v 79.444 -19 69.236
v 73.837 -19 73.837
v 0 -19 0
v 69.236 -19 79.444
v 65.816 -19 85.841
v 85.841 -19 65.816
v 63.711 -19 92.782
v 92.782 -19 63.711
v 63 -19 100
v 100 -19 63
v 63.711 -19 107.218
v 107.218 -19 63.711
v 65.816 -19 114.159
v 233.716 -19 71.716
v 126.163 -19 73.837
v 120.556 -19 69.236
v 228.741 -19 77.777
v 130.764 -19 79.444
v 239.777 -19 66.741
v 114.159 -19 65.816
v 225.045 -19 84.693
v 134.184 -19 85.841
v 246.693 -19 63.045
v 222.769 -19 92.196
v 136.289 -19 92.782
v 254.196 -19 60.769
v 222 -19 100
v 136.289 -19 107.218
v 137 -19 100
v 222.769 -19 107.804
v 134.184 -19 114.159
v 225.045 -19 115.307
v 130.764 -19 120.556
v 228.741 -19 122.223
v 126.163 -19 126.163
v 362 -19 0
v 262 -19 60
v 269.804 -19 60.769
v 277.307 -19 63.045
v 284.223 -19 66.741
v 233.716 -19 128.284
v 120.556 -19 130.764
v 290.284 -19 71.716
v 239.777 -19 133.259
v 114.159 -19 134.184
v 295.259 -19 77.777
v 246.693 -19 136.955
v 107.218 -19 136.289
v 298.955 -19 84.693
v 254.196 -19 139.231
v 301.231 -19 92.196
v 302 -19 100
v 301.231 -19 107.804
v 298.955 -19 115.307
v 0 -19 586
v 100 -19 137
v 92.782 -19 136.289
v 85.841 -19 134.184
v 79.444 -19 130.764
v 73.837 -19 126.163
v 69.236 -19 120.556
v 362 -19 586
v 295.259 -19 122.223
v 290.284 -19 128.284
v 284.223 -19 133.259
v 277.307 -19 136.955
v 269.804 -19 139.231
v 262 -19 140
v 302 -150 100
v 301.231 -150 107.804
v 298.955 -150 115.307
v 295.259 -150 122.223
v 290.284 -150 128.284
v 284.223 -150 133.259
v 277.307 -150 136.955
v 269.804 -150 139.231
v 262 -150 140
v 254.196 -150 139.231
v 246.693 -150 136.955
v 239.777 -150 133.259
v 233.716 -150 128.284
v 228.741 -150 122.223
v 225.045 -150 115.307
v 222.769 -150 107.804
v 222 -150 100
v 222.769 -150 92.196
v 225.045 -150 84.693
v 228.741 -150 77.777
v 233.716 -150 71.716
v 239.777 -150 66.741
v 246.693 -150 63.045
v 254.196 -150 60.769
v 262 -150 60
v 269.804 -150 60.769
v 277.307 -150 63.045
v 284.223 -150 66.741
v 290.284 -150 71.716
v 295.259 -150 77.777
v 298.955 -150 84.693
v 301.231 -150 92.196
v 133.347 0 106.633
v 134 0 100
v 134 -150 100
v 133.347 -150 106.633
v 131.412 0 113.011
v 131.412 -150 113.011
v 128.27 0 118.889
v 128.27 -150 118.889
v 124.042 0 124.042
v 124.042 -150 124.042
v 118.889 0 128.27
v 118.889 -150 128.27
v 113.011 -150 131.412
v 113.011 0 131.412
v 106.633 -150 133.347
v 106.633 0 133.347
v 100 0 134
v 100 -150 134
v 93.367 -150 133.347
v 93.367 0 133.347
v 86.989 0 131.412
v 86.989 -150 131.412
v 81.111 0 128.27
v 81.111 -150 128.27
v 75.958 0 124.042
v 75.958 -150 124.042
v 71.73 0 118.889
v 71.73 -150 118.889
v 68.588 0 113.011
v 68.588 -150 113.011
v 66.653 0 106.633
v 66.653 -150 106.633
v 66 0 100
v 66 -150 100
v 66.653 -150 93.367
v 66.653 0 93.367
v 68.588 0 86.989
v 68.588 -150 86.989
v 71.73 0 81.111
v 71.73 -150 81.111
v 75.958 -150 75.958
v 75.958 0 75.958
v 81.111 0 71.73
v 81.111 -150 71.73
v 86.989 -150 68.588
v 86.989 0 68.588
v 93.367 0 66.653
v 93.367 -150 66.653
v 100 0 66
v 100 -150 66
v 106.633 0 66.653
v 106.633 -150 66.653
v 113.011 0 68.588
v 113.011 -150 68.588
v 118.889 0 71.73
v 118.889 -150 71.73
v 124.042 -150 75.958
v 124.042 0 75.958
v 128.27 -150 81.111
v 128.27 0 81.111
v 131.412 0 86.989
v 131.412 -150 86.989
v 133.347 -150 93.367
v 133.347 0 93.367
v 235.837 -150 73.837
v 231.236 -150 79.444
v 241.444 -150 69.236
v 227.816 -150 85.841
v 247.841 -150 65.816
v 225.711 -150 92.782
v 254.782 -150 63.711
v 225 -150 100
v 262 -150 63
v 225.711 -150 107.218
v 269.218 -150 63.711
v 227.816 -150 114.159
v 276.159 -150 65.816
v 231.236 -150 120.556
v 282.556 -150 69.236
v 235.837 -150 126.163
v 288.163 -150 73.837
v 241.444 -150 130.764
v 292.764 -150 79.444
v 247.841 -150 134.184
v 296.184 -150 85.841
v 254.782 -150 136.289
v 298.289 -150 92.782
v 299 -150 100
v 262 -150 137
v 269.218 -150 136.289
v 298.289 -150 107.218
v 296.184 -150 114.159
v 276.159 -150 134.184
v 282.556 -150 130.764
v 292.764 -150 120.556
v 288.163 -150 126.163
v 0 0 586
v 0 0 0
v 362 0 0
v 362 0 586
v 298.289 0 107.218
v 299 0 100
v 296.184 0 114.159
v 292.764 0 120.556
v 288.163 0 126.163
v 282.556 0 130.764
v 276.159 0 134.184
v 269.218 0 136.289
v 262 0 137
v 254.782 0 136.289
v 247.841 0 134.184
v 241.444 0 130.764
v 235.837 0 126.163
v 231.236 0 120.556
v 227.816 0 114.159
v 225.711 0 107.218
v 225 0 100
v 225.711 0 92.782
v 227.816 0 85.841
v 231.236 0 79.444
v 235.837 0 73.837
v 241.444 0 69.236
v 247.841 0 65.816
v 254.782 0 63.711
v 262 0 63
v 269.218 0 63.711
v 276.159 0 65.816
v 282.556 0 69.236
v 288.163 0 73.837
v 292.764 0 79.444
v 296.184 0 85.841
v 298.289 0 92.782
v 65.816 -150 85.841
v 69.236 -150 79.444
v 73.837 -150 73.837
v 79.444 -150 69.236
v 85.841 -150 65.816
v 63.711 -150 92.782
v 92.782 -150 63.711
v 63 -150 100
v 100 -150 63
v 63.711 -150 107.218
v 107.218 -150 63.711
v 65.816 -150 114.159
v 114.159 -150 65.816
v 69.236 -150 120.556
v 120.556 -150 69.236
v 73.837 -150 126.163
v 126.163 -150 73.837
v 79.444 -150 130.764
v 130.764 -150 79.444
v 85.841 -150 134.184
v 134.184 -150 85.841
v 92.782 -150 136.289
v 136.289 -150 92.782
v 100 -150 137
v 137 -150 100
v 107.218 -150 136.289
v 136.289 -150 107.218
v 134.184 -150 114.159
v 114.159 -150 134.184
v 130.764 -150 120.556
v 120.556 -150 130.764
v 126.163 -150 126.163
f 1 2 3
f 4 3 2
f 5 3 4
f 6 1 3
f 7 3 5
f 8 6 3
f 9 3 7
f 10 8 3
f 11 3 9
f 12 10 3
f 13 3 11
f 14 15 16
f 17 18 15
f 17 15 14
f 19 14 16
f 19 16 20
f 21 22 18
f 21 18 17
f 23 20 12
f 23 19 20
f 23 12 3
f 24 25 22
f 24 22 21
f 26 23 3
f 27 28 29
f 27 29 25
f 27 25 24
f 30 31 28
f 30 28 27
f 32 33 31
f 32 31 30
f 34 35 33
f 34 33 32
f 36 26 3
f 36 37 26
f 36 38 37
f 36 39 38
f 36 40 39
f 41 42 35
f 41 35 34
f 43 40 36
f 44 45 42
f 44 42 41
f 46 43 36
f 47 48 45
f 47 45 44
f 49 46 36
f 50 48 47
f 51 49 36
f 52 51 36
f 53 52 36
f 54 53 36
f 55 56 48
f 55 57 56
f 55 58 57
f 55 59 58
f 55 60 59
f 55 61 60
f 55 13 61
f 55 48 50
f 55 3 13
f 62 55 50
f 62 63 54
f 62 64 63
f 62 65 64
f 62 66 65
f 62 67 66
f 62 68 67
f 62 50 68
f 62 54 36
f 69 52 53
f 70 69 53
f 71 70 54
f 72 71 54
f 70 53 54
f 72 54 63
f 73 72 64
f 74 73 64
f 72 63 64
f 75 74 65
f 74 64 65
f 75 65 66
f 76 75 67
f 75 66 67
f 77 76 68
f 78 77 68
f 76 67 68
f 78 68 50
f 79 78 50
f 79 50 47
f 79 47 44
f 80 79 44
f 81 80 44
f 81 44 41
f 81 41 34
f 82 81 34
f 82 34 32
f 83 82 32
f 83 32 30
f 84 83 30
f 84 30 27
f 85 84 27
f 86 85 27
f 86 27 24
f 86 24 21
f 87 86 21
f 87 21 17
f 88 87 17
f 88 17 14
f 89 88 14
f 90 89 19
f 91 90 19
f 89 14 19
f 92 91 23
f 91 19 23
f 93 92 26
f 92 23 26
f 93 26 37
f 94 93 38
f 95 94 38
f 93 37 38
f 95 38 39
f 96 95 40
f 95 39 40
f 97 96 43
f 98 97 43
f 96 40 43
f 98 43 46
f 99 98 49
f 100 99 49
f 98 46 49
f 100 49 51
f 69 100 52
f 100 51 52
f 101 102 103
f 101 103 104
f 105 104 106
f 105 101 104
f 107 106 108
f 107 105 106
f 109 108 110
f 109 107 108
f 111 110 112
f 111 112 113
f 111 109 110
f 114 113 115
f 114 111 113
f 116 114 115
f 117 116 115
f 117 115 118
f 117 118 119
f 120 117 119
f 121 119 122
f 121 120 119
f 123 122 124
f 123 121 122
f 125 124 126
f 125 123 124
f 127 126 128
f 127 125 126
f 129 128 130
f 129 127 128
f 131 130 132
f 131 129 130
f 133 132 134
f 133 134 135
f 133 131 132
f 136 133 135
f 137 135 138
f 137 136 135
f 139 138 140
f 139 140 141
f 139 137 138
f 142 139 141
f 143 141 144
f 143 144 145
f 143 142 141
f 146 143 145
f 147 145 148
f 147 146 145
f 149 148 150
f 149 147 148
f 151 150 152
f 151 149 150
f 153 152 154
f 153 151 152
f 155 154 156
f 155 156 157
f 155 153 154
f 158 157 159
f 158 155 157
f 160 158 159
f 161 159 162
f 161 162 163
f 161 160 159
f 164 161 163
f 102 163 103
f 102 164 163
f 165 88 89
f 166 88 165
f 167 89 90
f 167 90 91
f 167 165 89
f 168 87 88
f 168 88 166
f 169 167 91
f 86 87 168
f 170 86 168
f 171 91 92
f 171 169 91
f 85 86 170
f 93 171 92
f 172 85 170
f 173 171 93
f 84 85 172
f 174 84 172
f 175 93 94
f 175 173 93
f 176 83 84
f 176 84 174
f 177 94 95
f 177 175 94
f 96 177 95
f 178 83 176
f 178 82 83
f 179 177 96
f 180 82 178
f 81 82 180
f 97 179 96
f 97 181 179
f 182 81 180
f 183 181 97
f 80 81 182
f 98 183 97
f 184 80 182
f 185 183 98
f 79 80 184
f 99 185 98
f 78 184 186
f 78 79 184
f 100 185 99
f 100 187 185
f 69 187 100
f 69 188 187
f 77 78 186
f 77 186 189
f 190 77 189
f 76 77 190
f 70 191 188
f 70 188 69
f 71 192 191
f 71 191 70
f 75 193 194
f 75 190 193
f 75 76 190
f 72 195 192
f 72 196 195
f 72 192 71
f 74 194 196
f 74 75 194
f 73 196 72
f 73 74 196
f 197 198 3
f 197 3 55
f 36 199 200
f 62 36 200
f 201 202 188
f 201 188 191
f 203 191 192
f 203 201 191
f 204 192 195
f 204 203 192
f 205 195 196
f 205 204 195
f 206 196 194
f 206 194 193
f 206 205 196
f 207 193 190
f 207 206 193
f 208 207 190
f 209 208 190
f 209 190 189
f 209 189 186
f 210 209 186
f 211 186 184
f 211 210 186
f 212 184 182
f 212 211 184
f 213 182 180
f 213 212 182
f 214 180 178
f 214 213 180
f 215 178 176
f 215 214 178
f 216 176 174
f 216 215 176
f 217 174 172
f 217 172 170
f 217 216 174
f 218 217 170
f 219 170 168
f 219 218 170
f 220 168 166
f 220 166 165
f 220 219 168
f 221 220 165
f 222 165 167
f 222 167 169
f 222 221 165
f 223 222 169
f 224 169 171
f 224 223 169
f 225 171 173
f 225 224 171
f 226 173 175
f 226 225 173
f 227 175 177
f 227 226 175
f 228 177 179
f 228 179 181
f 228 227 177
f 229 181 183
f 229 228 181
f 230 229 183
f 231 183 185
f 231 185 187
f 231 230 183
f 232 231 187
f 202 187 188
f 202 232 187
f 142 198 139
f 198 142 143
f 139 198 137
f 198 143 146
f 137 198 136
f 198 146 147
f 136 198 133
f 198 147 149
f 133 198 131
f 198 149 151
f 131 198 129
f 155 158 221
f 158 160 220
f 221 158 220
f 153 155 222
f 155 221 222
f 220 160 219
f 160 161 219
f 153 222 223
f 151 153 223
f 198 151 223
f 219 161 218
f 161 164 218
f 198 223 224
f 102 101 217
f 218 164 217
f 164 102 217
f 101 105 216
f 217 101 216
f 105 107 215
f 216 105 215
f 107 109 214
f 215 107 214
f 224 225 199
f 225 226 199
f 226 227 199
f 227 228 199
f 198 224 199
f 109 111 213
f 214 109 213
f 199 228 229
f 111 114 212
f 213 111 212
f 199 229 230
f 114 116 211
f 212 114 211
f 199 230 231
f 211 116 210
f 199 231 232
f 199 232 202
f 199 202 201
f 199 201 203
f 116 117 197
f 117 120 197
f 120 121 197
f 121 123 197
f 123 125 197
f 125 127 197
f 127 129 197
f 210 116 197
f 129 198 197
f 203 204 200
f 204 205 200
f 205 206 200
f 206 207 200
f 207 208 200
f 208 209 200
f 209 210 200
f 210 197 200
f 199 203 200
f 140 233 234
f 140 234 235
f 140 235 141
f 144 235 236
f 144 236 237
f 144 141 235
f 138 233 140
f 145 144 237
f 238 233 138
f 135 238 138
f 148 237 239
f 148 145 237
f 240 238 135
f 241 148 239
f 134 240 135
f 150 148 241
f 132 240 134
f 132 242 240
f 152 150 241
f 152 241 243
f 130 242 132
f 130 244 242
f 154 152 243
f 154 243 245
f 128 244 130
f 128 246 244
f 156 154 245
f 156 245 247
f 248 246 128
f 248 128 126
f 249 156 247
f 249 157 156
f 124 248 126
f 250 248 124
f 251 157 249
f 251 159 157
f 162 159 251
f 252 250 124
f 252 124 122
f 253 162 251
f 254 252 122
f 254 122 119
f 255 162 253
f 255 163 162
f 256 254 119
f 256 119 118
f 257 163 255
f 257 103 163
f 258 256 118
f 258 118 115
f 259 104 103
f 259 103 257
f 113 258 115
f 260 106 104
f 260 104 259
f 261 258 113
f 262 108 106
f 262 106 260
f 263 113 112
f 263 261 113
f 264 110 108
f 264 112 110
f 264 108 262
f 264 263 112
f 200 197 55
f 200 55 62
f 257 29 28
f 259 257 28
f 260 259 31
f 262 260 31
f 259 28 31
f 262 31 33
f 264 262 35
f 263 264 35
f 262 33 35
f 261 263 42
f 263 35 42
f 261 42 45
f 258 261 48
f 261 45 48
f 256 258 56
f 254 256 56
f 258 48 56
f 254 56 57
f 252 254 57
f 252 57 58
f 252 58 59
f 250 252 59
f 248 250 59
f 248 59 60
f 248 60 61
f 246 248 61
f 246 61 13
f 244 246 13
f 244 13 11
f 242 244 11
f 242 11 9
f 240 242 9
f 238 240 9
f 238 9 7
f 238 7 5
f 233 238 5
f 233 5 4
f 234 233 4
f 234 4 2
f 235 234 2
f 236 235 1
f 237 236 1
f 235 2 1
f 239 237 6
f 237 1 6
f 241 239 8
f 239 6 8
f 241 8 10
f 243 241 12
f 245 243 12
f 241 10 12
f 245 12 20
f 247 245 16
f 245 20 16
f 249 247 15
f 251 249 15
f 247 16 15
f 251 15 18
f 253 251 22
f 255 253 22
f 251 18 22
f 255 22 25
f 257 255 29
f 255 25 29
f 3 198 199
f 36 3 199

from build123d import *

# Parameters (mm, degrees)
F0_W     = 362
F0_H     = 586
F0_R     = 37
F0_R_2   = 40
F1_DEPTH = 19
F2_DEPTH = 150
F0_R_3   = 34
F3_DEPTH = 150


with BuildPart() as f1:
    # F0 (on Front) → F1 (new body)
    with BuildSketch(Plane.XZ):
        with Locations((181, 293)):
            Rectangle(F0_W, F0_H)
        with Locations((100, 100)):
            Circle(F0_R, mode=Mode.SUBTRACT)
        with Locations((262, 100)):
            Circle(F0_R_2, mode=Mode.SUBTRACT)
    extrude(amount=F1_DEPTH)

    # F0 (on Front) → F2 (join)
    with BuildSketch(Plane.XZ):
        with Locations((262, 100)):
            Circle(F0_R_2)
        with Locations((262, 100)):
            Circle(F0_R, mode=Mode.SUBTRACT)
    extrude(amount=F2_DEPTH)

    # F0 (on Front) → F3 (join)
    with BuildSketch(Plane.XZ):
        with Locations((100, 100)):
            Circle(F0_R)
        with Locations((100, 100)):
            Circle(F0_R_3, mode=Mode.SUBTRACT)
    extrude(amount=F3_DEPTH)


solid = f1.part
